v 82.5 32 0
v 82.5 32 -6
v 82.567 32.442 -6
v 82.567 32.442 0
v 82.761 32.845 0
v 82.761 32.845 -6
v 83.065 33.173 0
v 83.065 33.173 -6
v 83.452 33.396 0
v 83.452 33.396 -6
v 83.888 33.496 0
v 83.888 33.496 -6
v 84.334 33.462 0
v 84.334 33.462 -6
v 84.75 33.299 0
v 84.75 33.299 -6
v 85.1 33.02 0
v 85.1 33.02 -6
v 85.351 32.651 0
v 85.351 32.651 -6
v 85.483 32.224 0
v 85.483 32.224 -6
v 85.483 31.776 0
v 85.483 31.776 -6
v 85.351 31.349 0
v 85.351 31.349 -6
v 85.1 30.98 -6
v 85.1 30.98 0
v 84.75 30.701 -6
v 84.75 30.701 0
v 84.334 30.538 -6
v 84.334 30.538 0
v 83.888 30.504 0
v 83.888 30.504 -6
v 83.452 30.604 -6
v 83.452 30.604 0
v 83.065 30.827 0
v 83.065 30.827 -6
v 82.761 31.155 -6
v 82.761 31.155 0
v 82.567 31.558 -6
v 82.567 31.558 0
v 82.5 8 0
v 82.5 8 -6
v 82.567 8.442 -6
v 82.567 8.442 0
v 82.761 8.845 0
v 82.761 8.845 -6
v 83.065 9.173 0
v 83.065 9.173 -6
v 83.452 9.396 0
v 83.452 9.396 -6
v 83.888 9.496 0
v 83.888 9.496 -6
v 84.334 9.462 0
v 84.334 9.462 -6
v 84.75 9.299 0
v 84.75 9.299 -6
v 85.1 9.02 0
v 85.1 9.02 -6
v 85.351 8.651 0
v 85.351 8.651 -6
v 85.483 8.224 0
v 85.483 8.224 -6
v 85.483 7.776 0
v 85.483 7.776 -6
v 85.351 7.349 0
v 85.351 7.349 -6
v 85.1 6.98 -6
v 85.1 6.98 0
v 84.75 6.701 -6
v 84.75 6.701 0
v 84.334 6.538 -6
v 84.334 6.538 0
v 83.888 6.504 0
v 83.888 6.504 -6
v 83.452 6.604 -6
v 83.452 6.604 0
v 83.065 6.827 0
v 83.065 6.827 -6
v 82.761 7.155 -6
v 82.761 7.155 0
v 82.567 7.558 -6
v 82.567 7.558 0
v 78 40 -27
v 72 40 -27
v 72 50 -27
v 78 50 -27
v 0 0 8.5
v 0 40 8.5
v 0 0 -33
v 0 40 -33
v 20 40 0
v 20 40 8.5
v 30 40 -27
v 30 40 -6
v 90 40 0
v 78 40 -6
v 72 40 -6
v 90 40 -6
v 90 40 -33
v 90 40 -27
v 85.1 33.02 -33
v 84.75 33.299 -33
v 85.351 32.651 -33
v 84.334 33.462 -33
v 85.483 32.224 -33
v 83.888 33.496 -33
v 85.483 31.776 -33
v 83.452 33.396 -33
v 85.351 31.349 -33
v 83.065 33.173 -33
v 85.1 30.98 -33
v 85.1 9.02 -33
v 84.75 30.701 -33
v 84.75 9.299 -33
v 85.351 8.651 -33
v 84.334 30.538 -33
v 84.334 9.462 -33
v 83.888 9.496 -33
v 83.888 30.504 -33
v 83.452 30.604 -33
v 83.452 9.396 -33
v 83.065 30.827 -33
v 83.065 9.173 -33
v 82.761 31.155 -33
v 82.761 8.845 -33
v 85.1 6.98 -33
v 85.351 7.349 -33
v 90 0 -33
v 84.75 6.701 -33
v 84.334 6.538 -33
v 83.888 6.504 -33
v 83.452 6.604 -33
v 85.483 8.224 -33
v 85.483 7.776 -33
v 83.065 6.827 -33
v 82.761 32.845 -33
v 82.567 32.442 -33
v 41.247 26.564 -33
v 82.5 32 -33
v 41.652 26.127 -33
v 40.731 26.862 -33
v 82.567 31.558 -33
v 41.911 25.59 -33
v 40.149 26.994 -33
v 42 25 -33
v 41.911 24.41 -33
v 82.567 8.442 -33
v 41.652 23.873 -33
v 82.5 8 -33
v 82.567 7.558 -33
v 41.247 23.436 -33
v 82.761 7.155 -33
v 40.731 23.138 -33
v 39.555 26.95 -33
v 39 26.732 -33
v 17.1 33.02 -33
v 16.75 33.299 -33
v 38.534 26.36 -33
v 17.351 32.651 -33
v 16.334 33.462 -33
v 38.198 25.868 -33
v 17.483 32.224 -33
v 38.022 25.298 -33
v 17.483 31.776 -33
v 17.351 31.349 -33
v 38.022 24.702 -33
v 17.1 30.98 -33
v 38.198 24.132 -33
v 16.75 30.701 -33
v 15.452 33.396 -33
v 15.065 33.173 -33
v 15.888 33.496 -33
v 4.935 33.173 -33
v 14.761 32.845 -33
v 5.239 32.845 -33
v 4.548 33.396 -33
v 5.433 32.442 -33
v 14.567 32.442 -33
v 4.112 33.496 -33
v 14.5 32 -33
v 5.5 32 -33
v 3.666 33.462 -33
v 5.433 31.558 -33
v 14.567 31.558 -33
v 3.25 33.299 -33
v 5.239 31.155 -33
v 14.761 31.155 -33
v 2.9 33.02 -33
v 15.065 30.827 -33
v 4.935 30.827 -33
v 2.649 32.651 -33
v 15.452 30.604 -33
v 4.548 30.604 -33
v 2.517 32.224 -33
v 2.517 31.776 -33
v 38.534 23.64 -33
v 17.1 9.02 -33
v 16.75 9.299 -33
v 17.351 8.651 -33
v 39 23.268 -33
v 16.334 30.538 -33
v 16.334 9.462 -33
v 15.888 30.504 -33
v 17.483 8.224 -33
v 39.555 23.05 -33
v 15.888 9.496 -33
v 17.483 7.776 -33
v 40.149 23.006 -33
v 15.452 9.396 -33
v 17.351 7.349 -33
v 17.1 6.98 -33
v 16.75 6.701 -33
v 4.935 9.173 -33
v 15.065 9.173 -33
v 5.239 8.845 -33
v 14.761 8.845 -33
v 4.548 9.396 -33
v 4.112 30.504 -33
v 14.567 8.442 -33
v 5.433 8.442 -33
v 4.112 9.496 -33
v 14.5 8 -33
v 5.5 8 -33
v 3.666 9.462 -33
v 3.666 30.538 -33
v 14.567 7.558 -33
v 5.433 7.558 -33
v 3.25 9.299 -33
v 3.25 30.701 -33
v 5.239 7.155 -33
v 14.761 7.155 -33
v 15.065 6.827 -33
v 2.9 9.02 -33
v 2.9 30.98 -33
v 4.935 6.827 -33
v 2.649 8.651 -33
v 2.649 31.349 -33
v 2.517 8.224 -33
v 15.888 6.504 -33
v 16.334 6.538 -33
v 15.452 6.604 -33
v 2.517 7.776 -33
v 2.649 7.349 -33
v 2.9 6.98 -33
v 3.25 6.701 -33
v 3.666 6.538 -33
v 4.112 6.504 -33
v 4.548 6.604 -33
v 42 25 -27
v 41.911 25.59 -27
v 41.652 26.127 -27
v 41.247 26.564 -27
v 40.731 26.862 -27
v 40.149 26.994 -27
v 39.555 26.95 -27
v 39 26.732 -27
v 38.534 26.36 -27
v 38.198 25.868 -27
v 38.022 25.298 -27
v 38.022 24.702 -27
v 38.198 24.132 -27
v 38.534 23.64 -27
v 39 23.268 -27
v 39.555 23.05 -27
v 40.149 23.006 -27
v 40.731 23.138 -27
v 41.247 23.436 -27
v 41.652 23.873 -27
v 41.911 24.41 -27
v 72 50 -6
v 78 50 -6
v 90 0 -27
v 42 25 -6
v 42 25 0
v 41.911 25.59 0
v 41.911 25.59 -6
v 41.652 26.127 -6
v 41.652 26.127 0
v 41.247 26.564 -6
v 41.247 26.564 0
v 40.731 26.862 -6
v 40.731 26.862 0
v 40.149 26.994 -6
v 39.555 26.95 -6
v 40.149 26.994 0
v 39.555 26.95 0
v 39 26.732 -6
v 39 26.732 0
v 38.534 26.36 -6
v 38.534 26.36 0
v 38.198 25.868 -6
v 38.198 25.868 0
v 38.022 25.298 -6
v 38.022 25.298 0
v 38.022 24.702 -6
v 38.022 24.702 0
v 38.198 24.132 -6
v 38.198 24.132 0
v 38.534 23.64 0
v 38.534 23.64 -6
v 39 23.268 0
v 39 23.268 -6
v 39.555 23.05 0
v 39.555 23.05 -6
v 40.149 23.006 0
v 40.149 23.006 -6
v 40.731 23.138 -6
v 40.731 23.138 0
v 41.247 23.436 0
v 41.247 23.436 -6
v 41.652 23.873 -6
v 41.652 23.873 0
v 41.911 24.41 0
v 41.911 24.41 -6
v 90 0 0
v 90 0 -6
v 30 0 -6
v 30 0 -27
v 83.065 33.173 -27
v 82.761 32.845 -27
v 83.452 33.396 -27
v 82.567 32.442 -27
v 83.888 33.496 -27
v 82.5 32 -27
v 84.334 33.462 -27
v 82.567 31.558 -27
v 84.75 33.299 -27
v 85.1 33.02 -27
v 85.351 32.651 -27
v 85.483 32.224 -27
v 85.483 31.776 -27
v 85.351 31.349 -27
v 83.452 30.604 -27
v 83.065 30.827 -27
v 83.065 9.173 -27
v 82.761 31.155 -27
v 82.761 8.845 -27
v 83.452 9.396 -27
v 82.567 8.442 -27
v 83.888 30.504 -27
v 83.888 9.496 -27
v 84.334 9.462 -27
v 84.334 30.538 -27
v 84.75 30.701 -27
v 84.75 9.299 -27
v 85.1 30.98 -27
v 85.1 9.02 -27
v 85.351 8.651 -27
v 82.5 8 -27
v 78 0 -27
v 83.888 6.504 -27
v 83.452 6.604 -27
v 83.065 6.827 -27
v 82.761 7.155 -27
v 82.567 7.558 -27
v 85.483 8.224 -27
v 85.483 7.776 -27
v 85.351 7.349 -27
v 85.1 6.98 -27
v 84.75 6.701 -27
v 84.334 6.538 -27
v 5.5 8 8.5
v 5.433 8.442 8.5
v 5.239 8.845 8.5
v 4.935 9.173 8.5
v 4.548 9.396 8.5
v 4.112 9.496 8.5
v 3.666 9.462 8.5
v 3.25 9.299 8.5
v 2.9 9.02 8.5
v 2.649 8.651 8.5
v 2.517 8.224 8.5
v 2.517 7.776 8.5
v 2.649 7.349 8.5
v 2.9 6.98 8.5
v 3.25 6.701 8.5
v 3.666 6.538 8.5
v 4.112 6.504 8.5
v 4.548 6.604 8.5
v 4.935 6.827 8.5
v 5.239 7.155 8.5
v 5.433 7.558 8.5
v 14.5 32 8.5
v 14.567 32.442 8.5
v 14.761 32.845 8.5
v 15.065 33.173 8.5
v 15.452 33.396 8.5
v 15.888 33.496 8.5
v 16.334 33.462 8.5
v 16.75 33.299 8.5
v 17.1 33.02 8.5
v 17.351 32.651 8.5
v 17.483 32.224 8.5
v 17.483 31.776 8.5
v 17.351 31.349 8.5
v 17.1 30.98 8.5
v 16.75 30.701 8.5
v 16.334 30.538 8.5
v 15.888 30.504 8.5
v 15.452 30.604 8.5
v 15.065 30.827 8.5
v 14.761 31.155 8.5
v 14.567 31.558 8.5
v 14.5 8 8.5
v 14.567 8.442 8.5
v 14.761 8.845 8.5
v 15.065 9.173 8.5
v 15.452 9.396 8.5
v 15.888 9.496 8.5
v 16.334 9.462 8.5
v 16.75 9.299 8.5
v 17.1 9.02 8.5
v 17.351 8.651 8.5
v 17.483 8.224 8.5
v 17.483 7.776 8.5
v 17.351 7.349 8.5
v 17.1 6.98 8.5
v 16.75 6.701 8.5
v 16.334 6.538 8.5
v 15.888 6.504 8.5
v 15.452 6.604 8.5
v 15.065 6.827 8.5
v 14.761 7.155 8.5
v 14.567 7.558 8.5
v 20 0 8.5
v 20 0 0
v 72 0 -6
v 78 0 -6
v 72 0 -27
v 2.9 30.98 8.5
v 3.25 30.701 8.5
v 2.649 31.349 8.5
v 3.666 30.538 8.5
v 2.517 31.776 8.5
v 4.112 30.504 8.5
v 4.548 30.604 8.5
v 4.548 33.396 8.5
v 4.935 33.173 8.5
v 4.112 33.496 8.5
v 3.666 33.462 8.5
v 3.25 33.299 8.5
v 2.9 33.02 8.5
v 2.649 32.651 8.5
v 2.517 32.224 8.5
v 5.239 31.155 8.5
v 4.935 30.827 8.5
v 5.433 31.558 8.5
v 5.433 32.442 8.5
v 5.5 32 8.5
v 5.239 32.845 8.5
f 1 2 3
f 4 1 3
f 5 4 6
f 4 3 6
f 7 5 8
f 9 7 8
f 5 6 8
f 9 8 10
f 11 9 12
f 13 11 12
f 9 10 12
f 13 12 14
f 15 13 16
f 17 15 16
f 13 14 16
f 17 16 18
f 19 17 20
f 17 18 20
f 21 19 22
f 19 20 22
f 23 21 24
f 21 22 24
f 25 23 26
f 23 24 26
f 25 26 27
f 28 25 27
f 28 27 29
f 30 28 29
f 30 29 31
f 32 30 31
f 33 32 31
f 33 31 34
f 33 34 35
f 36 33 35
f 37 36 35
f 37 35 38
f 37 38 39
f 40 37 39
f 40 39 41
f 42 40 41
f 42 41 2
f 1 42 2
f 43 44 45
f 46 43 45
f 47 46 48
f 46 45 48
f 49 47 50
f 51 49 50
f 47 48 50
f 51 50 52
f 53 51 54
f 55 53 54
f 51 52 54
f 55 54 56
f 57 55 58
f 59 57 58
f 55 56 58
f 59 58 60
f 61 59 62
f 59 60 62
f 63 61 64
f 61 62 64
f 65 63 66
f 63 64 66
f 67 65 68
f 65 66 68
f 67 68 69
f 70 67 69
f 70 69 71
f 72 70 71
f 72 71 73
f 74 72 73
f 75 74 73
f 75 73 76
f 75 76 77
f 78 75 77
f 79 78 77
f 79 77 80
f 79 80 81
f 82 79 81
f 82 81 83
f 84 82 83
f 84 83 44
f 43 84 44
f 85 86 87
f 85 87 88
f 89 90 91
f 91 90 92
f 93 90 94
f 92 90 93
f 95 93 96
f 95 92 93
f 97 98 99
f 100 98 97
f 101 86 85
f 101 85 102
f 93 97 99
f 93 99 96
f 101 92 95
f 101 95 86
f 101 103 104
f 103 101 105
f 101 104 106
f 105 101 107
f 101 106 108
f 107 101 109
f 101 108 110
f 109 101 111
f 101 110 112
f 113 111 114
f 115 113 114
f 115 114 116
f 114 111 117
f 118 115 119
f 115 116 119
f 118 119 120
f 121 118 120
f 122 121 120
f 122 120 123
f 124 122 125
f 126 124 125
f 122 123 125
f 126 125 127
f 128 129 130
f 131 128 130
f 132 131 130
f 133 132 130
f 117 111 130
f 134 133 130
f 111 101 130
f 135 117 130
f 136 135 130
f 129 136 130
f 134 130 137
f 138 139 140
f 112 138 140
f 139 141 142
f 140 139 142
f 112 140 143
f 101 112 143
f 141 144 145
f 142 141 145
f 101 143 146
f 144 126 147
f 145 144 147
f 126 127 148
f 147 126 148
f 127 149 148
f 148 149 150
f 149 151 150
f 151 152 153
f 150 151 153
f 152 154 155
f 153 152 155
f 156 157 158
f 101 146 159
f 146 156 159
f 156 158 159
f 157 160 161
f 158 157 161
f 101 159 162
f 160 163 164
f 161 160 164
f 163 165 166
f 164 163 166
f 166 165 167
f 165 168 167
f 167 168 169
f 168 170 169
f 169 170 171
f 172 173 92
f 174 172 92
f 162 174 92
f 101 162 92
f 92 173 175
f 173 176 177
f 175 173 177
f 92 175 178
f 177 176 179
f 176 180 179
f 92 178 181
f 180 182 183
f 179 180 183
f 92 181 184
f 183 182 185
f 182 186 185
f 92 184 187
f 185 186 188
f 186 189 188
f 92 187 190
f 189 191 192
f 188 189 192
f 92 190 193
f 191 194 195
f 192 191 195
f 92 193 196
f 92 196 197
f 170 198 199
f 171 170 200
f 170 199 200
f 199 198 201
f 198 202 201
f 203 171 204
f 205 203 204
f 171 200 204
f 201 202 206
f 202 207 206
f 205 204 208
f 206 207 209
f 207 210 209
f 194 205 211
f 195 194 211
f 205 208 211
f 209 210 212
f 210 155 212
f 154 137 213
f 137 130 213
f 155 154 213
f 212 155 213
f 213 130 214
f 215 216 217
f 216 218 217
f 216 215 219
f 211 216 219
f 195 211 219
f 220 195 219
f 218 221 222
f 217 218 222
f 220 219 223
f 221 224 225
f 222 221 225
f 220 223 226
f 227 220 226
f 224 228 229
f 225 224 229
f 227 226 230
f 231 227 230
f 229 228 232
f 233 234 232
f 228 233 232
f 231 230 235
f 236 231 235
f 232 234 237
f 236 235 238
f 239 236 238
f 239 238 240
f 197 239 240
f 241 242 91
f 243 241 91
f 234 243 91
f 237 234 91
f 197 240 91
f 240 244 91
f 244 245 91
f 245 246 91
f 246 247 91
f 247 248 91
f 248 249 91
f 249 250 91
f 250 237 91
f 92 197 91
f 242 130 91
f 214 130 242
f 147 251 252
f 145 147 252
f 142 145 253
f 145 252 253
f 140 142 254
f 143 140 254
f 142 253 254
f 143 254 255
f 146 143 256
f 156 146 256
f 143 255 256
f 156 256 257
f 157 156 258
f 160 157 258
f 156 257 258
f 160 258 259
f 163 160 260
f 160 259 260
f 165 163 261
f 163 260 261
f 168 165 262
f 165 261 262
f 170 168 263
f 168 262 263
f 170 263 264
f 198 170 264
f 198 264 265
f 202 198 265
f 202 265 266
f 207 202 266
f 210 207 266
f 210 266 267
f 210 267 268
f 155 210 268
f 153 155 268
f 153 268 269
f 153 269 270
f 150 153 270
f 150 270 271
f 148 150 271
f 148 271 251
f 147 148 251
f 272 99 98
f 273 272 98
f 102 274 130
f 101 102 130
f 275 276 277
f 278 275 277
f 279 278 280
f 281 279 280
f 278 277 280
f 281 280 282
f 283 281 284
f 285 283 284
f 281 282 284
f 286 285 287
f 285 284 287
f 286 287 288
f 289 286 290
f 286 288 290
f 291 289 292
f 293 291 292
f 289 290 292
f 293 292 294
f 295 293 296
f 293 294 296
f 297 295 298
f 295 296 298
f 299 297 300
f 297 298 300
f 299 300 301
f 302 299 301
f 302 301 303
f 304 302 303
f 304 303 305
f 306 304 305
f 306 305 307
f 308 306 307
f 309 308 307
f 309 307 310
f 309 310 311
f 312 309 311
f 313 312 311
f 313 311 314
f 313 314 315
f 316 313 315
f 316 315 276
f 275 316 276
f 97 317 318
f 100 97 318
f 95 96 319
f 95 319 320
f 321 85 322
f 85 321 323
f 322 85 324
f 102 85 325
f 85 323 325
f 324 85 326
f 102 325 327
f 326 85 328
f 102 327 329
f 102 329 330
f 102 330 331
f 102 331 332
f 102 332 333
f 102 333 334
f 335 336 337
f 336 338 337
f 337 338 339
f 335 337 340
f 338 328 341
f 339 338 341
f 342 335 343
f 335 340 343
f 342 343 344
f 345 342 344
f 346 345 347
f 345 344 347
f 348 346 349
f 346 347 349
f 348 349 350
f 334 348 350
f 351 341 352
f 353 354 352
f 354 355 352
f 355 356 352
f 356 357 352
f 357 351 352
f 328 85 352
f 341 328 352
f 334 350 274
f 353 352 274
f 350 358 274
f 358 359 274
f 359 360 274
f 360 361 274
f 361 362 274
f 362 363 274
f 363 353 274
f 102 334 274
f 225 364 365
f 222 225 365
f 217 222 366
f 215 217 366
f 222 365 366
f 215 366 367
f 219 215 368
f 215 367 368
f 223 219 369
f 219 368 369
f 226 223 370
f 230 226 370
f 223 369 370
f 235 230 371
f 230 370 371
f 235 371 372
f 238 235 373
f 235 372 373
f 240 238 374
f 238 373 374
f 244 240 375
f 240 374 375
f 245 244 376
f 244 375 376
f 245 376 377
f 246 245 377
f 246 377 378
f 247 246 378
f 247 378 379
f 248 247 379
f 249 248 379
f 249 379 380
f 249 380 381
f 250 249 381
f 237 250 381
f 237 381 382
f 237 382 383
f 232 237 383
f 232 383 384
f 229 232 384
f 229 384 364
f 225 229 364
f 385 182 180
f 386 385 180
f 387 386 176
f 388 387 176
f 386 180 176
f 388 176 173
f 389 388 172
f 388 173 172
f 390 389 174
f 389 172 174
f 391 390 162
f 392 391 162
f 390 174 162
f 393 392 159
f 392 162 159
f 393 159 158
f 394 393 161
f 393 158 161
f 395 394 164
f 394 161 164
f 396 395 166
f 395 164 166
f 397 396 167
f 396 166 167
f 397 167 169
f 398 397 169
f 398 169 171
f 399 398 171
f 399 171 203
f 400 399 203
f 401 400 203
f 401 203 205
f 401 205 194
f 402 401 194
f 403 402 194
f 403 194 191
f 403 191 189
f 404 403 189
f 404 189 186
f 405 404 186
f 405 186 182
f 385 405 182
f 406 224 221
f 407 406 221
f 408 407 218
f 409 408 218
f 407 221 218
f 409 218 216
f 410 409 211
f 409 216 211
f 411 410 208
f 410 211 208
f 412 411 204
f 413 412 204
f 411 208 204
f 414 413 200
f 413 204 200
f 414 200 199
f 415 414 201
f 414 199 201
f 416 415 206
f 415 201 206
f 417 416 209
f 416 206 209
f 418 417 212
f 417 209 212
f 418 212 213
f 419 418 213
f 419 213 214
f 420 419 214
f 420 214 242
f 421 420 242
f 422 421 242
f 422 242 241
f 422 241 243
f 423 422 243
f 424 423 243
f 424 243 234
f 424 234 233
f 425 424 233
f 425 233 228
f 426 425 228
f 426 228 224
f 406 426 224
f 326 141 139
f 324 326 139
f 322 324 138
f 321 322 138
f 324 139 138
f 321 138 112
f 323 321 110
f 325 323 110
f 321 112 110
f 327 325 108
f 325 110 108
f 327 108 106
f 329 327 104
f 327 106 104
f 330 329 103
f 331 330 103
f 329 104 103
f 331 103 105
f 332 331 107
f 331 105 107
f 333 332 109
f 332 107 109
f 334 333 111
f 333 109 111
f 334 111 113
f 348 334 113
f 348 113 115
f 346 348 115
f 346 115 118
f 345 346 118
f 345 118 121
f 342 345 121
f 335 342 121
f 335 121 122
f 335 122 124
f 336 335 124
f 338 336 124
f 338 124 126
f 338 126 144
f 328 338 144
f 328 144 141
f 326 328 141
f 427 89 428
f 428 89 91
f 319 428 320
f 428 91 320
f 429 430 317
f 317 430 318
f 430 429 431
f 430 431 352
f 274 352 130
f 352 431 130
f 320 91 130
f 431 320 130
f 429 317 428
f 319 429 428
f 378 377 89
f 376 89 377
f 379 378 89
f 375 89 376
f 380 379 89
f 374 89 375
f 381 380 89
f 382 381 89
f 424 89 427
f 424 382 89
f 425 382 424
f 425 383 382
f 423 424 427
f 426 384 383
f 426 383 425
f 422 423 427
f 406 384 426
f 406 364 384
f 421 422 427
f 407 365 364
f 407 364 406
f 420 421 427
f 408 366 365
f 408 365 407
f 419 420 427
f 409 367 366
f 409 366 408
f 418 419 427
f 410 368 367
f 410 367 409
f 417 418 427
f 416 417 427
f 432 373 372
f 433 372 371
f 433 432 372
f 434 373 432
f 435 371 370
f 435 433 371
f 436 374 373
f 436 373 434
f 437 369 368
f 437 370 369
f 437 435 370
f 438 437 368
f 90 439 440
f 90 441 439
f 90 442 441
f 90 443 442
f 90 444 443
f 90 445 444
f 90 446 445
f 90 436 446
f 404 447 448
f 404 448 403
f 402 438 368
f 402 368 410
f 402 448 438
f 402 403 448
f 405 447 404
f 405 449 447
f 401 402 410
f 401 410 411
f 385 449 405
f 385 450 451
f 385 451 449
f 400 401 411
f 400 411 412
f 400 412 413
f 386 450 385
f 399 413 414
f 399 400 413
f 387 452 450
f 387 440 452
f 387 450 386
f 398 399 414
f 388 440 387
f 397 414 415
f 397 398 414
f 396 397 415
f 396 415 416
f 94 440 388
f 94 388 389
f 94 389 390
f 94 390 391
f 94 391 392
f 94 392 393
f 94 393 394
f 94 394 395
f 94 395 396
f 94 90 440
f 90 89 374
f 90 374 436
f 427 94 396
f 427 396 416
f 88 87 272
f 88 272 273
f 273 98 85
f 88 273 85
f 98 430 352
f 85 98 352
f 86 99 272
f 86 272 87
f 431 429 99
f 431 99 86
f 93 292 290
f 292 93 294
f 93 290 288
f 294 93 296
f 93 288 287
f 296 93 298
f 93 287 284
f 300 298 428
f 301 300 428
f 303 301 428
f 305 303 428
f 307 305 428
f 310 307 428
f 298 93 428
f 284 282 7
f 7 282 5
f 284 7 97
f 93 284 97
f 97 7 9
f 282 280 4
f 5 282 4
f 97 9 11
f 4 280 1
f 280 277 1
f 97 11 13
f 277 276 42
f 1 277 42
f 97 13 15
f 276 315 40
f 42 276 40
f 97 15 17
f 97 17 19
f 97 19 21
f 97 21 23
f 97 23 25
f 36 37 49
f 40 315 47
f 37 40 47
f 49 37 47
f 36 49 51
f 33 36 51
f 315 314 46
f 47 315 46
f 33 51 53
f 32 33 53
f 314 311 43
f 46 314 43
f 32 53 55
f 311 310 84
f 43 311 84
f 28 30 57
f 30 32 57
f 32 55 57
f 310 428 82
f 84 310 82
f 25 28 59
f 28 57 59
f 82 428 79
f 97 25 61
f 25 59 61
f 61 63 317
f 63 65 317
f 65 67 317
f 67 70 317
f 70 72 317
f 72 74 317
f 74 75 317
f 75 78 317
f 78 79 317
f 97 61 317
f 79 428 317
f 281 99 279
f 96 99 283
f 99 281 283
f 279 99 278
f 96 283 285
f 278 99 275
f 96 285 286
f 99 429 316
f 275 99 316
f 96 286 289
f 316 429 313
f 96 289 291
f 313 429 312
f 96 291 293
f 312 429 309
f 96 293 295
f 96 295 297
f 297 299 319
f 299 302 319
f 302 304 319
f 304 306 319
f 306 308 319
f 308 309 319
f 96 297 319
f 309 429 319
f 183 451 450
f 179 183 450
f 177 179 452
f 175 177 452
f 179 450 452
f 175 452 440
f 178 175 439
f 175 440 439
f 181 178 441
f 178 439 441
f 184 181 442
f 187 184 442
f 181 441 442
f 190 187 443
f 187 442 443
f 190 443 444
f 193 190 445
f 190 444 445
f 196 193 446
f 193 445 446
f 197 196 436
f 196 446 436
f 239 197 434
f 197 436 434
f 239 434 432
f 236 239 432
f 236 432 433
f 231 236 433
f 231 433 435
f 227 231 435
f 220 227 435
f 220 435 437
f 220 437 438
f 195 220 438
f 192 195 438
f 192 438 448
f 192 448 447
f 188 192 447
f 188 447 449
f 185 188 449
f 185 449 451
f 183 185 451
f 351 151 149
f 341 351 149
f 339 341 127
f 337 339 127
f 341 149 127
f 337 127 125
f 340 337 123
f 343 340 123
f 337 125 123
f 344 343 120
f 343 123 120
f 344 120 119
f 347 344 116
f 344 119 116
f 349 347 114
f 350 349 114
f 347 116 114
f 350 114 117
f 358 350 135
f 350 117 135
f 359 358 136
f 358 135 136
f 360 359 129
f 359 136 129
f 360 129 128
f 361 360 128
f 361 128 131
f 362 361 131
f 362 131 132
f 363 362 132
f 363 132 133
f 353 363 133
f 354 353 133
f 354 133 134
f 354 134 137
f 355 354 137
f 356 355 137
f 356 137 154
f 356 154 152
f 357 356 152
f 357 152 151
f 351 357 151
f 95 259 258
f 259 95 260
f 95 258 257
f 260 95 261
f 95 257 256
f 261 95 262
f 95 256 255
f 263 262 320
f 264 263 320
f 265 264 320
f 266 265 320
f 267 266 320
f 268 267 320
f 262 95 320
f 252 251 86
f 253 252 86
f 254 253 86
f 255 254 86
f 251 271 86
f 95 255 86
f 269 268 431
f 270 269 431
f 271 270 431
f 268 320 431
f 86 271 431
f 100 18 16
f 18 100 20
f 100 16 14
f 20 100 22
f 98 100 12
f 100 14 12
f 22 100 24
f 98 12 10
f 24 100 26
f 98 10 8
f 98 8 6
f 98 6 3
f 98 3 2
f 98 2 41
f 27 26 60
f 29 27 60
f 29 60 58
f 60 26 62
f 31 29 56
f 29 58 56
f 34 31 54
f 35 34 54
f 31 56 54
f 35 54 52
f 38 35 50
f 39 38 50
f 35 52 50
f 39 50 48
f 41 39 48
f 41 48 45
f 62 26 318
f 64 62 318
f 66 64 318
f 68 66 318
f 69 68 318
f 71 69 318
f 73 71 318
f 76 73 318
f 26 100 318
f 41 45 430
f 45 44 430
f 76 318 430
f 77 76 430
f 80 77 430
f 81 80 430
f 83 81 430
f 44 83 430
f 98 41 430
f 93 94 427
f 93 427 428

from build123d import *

# Parameters (mm, degrees)
EXTRUDE_1_DEPTH      = 40
SKETCH_7_W           = 20
SKETCH_7_H           = 8.5
EXTRUDE_5_DEPTH      = 40
SKETCH_8_R           = 1.5
CUT_EXTRUDE_2_DEPTH  = 107.874926901
SKETCH_9_R           = 1.5
CUT_EXTRUDE_3_DEPTH  = 107.874926901
EXTRUDE_6_DEPTH      = 10
EXTRUDE_6_DEPTH_BACK = 40
SKETCH_10_W          = 6
SKETCH_10_H          = 21
SKETCH_11_R          = 2
CUT_EXTRUDE_4_DEPTH  = 109.115678789


with BuildPart() as part:
    # 草图1 → 凸台-拉伸1 (new body)
    with BuildSketch(Plane(origin=(0, 0, 0), x_dir=(1, 0, 0), z_dir=(0, 1, 0))):
        Polygon((0, 0), (90, 0), (90, 6), (30, 6), (30, 27), (90, 27), (90, 33), (0, 33), align=None)
    extrude(amount=EXTRUDE_1_DEPTH)

    # 草图7 → 凸台-拉伸5 (add)
    with BuildSketch(Plane(origin=(0, 40, 0), x_dir=(1, 0, 0), z_dir=(0, 1, 0))):
        with Locations((10, -4.25)):
            Rectangle(SKETCH_7_W, SKETCH_7_H)
    extrude(amount=-EXTRUDE_5_DEPTH)

    # 草图8 → 切除-拉伸2 (cut, through all)
    with BuildSketch(Plane(origin=(0, 0, -33), x_dir=(-1, 0, 0), z_dir=(0, 0, -1))):
        with Locations((-84, 8)):
            Circle(SKETCH_8_R)
        with Locations((-84, 32)):
            Circle(SKETCH_8_R)
        with Locations((-16, 32)):
            Circle(SKETCH_8_R)
        with Locations((-16, 8)):
            Circle(SKETCH_8_R)
    extrude(amount=-CUT_EXTRUDE_2_DEPTH, mode=Mode.SUBTRACT)

    # 草图9 → 切除-拉伸3 (cut, through all)
    with BuildSketch(Plane.XY.offset(8.5)):
        with Locations((4, 32)):
            Circle(SKETCH_9_R)
        with Locations((4, 8)):
            Circle(SKETCH_9_R)
    extrude(amount=-CUT_EXTRUDE_3_DEPTH, mode=Mode.SUBTRACT)

    # 草图10 → 凸台-拉伸6 (add, two sides: drawn at the far end of the back side and taken through both)
    with BuildSketch(Plane(origin=(0, 40, 0), x_dir=(1, 0, 0), z_dir=(0, 1, 0)).offset(-EXTRUDE_6_DEPTH_BACK)):
        with Locations((75, 16.5)):
            Rectangle(SKETCH_10_W, SKETCH_10_H)
    extrude(amount=EXTRUDE_6_DEPTH + EXTRUDE_6_DEPTH_BACK)

    # 草图11 → 切除-拉伸4 (cut, through all)
    with BuildSketch(Plane.XY):
        with Locations((40, 25)):
            Circle(SKETCH_11_R)
    extrude(amount=-CUT_EXTRUDE_4_DEPTH, mode=Mode.SUBTRACT)


solid = part.part
